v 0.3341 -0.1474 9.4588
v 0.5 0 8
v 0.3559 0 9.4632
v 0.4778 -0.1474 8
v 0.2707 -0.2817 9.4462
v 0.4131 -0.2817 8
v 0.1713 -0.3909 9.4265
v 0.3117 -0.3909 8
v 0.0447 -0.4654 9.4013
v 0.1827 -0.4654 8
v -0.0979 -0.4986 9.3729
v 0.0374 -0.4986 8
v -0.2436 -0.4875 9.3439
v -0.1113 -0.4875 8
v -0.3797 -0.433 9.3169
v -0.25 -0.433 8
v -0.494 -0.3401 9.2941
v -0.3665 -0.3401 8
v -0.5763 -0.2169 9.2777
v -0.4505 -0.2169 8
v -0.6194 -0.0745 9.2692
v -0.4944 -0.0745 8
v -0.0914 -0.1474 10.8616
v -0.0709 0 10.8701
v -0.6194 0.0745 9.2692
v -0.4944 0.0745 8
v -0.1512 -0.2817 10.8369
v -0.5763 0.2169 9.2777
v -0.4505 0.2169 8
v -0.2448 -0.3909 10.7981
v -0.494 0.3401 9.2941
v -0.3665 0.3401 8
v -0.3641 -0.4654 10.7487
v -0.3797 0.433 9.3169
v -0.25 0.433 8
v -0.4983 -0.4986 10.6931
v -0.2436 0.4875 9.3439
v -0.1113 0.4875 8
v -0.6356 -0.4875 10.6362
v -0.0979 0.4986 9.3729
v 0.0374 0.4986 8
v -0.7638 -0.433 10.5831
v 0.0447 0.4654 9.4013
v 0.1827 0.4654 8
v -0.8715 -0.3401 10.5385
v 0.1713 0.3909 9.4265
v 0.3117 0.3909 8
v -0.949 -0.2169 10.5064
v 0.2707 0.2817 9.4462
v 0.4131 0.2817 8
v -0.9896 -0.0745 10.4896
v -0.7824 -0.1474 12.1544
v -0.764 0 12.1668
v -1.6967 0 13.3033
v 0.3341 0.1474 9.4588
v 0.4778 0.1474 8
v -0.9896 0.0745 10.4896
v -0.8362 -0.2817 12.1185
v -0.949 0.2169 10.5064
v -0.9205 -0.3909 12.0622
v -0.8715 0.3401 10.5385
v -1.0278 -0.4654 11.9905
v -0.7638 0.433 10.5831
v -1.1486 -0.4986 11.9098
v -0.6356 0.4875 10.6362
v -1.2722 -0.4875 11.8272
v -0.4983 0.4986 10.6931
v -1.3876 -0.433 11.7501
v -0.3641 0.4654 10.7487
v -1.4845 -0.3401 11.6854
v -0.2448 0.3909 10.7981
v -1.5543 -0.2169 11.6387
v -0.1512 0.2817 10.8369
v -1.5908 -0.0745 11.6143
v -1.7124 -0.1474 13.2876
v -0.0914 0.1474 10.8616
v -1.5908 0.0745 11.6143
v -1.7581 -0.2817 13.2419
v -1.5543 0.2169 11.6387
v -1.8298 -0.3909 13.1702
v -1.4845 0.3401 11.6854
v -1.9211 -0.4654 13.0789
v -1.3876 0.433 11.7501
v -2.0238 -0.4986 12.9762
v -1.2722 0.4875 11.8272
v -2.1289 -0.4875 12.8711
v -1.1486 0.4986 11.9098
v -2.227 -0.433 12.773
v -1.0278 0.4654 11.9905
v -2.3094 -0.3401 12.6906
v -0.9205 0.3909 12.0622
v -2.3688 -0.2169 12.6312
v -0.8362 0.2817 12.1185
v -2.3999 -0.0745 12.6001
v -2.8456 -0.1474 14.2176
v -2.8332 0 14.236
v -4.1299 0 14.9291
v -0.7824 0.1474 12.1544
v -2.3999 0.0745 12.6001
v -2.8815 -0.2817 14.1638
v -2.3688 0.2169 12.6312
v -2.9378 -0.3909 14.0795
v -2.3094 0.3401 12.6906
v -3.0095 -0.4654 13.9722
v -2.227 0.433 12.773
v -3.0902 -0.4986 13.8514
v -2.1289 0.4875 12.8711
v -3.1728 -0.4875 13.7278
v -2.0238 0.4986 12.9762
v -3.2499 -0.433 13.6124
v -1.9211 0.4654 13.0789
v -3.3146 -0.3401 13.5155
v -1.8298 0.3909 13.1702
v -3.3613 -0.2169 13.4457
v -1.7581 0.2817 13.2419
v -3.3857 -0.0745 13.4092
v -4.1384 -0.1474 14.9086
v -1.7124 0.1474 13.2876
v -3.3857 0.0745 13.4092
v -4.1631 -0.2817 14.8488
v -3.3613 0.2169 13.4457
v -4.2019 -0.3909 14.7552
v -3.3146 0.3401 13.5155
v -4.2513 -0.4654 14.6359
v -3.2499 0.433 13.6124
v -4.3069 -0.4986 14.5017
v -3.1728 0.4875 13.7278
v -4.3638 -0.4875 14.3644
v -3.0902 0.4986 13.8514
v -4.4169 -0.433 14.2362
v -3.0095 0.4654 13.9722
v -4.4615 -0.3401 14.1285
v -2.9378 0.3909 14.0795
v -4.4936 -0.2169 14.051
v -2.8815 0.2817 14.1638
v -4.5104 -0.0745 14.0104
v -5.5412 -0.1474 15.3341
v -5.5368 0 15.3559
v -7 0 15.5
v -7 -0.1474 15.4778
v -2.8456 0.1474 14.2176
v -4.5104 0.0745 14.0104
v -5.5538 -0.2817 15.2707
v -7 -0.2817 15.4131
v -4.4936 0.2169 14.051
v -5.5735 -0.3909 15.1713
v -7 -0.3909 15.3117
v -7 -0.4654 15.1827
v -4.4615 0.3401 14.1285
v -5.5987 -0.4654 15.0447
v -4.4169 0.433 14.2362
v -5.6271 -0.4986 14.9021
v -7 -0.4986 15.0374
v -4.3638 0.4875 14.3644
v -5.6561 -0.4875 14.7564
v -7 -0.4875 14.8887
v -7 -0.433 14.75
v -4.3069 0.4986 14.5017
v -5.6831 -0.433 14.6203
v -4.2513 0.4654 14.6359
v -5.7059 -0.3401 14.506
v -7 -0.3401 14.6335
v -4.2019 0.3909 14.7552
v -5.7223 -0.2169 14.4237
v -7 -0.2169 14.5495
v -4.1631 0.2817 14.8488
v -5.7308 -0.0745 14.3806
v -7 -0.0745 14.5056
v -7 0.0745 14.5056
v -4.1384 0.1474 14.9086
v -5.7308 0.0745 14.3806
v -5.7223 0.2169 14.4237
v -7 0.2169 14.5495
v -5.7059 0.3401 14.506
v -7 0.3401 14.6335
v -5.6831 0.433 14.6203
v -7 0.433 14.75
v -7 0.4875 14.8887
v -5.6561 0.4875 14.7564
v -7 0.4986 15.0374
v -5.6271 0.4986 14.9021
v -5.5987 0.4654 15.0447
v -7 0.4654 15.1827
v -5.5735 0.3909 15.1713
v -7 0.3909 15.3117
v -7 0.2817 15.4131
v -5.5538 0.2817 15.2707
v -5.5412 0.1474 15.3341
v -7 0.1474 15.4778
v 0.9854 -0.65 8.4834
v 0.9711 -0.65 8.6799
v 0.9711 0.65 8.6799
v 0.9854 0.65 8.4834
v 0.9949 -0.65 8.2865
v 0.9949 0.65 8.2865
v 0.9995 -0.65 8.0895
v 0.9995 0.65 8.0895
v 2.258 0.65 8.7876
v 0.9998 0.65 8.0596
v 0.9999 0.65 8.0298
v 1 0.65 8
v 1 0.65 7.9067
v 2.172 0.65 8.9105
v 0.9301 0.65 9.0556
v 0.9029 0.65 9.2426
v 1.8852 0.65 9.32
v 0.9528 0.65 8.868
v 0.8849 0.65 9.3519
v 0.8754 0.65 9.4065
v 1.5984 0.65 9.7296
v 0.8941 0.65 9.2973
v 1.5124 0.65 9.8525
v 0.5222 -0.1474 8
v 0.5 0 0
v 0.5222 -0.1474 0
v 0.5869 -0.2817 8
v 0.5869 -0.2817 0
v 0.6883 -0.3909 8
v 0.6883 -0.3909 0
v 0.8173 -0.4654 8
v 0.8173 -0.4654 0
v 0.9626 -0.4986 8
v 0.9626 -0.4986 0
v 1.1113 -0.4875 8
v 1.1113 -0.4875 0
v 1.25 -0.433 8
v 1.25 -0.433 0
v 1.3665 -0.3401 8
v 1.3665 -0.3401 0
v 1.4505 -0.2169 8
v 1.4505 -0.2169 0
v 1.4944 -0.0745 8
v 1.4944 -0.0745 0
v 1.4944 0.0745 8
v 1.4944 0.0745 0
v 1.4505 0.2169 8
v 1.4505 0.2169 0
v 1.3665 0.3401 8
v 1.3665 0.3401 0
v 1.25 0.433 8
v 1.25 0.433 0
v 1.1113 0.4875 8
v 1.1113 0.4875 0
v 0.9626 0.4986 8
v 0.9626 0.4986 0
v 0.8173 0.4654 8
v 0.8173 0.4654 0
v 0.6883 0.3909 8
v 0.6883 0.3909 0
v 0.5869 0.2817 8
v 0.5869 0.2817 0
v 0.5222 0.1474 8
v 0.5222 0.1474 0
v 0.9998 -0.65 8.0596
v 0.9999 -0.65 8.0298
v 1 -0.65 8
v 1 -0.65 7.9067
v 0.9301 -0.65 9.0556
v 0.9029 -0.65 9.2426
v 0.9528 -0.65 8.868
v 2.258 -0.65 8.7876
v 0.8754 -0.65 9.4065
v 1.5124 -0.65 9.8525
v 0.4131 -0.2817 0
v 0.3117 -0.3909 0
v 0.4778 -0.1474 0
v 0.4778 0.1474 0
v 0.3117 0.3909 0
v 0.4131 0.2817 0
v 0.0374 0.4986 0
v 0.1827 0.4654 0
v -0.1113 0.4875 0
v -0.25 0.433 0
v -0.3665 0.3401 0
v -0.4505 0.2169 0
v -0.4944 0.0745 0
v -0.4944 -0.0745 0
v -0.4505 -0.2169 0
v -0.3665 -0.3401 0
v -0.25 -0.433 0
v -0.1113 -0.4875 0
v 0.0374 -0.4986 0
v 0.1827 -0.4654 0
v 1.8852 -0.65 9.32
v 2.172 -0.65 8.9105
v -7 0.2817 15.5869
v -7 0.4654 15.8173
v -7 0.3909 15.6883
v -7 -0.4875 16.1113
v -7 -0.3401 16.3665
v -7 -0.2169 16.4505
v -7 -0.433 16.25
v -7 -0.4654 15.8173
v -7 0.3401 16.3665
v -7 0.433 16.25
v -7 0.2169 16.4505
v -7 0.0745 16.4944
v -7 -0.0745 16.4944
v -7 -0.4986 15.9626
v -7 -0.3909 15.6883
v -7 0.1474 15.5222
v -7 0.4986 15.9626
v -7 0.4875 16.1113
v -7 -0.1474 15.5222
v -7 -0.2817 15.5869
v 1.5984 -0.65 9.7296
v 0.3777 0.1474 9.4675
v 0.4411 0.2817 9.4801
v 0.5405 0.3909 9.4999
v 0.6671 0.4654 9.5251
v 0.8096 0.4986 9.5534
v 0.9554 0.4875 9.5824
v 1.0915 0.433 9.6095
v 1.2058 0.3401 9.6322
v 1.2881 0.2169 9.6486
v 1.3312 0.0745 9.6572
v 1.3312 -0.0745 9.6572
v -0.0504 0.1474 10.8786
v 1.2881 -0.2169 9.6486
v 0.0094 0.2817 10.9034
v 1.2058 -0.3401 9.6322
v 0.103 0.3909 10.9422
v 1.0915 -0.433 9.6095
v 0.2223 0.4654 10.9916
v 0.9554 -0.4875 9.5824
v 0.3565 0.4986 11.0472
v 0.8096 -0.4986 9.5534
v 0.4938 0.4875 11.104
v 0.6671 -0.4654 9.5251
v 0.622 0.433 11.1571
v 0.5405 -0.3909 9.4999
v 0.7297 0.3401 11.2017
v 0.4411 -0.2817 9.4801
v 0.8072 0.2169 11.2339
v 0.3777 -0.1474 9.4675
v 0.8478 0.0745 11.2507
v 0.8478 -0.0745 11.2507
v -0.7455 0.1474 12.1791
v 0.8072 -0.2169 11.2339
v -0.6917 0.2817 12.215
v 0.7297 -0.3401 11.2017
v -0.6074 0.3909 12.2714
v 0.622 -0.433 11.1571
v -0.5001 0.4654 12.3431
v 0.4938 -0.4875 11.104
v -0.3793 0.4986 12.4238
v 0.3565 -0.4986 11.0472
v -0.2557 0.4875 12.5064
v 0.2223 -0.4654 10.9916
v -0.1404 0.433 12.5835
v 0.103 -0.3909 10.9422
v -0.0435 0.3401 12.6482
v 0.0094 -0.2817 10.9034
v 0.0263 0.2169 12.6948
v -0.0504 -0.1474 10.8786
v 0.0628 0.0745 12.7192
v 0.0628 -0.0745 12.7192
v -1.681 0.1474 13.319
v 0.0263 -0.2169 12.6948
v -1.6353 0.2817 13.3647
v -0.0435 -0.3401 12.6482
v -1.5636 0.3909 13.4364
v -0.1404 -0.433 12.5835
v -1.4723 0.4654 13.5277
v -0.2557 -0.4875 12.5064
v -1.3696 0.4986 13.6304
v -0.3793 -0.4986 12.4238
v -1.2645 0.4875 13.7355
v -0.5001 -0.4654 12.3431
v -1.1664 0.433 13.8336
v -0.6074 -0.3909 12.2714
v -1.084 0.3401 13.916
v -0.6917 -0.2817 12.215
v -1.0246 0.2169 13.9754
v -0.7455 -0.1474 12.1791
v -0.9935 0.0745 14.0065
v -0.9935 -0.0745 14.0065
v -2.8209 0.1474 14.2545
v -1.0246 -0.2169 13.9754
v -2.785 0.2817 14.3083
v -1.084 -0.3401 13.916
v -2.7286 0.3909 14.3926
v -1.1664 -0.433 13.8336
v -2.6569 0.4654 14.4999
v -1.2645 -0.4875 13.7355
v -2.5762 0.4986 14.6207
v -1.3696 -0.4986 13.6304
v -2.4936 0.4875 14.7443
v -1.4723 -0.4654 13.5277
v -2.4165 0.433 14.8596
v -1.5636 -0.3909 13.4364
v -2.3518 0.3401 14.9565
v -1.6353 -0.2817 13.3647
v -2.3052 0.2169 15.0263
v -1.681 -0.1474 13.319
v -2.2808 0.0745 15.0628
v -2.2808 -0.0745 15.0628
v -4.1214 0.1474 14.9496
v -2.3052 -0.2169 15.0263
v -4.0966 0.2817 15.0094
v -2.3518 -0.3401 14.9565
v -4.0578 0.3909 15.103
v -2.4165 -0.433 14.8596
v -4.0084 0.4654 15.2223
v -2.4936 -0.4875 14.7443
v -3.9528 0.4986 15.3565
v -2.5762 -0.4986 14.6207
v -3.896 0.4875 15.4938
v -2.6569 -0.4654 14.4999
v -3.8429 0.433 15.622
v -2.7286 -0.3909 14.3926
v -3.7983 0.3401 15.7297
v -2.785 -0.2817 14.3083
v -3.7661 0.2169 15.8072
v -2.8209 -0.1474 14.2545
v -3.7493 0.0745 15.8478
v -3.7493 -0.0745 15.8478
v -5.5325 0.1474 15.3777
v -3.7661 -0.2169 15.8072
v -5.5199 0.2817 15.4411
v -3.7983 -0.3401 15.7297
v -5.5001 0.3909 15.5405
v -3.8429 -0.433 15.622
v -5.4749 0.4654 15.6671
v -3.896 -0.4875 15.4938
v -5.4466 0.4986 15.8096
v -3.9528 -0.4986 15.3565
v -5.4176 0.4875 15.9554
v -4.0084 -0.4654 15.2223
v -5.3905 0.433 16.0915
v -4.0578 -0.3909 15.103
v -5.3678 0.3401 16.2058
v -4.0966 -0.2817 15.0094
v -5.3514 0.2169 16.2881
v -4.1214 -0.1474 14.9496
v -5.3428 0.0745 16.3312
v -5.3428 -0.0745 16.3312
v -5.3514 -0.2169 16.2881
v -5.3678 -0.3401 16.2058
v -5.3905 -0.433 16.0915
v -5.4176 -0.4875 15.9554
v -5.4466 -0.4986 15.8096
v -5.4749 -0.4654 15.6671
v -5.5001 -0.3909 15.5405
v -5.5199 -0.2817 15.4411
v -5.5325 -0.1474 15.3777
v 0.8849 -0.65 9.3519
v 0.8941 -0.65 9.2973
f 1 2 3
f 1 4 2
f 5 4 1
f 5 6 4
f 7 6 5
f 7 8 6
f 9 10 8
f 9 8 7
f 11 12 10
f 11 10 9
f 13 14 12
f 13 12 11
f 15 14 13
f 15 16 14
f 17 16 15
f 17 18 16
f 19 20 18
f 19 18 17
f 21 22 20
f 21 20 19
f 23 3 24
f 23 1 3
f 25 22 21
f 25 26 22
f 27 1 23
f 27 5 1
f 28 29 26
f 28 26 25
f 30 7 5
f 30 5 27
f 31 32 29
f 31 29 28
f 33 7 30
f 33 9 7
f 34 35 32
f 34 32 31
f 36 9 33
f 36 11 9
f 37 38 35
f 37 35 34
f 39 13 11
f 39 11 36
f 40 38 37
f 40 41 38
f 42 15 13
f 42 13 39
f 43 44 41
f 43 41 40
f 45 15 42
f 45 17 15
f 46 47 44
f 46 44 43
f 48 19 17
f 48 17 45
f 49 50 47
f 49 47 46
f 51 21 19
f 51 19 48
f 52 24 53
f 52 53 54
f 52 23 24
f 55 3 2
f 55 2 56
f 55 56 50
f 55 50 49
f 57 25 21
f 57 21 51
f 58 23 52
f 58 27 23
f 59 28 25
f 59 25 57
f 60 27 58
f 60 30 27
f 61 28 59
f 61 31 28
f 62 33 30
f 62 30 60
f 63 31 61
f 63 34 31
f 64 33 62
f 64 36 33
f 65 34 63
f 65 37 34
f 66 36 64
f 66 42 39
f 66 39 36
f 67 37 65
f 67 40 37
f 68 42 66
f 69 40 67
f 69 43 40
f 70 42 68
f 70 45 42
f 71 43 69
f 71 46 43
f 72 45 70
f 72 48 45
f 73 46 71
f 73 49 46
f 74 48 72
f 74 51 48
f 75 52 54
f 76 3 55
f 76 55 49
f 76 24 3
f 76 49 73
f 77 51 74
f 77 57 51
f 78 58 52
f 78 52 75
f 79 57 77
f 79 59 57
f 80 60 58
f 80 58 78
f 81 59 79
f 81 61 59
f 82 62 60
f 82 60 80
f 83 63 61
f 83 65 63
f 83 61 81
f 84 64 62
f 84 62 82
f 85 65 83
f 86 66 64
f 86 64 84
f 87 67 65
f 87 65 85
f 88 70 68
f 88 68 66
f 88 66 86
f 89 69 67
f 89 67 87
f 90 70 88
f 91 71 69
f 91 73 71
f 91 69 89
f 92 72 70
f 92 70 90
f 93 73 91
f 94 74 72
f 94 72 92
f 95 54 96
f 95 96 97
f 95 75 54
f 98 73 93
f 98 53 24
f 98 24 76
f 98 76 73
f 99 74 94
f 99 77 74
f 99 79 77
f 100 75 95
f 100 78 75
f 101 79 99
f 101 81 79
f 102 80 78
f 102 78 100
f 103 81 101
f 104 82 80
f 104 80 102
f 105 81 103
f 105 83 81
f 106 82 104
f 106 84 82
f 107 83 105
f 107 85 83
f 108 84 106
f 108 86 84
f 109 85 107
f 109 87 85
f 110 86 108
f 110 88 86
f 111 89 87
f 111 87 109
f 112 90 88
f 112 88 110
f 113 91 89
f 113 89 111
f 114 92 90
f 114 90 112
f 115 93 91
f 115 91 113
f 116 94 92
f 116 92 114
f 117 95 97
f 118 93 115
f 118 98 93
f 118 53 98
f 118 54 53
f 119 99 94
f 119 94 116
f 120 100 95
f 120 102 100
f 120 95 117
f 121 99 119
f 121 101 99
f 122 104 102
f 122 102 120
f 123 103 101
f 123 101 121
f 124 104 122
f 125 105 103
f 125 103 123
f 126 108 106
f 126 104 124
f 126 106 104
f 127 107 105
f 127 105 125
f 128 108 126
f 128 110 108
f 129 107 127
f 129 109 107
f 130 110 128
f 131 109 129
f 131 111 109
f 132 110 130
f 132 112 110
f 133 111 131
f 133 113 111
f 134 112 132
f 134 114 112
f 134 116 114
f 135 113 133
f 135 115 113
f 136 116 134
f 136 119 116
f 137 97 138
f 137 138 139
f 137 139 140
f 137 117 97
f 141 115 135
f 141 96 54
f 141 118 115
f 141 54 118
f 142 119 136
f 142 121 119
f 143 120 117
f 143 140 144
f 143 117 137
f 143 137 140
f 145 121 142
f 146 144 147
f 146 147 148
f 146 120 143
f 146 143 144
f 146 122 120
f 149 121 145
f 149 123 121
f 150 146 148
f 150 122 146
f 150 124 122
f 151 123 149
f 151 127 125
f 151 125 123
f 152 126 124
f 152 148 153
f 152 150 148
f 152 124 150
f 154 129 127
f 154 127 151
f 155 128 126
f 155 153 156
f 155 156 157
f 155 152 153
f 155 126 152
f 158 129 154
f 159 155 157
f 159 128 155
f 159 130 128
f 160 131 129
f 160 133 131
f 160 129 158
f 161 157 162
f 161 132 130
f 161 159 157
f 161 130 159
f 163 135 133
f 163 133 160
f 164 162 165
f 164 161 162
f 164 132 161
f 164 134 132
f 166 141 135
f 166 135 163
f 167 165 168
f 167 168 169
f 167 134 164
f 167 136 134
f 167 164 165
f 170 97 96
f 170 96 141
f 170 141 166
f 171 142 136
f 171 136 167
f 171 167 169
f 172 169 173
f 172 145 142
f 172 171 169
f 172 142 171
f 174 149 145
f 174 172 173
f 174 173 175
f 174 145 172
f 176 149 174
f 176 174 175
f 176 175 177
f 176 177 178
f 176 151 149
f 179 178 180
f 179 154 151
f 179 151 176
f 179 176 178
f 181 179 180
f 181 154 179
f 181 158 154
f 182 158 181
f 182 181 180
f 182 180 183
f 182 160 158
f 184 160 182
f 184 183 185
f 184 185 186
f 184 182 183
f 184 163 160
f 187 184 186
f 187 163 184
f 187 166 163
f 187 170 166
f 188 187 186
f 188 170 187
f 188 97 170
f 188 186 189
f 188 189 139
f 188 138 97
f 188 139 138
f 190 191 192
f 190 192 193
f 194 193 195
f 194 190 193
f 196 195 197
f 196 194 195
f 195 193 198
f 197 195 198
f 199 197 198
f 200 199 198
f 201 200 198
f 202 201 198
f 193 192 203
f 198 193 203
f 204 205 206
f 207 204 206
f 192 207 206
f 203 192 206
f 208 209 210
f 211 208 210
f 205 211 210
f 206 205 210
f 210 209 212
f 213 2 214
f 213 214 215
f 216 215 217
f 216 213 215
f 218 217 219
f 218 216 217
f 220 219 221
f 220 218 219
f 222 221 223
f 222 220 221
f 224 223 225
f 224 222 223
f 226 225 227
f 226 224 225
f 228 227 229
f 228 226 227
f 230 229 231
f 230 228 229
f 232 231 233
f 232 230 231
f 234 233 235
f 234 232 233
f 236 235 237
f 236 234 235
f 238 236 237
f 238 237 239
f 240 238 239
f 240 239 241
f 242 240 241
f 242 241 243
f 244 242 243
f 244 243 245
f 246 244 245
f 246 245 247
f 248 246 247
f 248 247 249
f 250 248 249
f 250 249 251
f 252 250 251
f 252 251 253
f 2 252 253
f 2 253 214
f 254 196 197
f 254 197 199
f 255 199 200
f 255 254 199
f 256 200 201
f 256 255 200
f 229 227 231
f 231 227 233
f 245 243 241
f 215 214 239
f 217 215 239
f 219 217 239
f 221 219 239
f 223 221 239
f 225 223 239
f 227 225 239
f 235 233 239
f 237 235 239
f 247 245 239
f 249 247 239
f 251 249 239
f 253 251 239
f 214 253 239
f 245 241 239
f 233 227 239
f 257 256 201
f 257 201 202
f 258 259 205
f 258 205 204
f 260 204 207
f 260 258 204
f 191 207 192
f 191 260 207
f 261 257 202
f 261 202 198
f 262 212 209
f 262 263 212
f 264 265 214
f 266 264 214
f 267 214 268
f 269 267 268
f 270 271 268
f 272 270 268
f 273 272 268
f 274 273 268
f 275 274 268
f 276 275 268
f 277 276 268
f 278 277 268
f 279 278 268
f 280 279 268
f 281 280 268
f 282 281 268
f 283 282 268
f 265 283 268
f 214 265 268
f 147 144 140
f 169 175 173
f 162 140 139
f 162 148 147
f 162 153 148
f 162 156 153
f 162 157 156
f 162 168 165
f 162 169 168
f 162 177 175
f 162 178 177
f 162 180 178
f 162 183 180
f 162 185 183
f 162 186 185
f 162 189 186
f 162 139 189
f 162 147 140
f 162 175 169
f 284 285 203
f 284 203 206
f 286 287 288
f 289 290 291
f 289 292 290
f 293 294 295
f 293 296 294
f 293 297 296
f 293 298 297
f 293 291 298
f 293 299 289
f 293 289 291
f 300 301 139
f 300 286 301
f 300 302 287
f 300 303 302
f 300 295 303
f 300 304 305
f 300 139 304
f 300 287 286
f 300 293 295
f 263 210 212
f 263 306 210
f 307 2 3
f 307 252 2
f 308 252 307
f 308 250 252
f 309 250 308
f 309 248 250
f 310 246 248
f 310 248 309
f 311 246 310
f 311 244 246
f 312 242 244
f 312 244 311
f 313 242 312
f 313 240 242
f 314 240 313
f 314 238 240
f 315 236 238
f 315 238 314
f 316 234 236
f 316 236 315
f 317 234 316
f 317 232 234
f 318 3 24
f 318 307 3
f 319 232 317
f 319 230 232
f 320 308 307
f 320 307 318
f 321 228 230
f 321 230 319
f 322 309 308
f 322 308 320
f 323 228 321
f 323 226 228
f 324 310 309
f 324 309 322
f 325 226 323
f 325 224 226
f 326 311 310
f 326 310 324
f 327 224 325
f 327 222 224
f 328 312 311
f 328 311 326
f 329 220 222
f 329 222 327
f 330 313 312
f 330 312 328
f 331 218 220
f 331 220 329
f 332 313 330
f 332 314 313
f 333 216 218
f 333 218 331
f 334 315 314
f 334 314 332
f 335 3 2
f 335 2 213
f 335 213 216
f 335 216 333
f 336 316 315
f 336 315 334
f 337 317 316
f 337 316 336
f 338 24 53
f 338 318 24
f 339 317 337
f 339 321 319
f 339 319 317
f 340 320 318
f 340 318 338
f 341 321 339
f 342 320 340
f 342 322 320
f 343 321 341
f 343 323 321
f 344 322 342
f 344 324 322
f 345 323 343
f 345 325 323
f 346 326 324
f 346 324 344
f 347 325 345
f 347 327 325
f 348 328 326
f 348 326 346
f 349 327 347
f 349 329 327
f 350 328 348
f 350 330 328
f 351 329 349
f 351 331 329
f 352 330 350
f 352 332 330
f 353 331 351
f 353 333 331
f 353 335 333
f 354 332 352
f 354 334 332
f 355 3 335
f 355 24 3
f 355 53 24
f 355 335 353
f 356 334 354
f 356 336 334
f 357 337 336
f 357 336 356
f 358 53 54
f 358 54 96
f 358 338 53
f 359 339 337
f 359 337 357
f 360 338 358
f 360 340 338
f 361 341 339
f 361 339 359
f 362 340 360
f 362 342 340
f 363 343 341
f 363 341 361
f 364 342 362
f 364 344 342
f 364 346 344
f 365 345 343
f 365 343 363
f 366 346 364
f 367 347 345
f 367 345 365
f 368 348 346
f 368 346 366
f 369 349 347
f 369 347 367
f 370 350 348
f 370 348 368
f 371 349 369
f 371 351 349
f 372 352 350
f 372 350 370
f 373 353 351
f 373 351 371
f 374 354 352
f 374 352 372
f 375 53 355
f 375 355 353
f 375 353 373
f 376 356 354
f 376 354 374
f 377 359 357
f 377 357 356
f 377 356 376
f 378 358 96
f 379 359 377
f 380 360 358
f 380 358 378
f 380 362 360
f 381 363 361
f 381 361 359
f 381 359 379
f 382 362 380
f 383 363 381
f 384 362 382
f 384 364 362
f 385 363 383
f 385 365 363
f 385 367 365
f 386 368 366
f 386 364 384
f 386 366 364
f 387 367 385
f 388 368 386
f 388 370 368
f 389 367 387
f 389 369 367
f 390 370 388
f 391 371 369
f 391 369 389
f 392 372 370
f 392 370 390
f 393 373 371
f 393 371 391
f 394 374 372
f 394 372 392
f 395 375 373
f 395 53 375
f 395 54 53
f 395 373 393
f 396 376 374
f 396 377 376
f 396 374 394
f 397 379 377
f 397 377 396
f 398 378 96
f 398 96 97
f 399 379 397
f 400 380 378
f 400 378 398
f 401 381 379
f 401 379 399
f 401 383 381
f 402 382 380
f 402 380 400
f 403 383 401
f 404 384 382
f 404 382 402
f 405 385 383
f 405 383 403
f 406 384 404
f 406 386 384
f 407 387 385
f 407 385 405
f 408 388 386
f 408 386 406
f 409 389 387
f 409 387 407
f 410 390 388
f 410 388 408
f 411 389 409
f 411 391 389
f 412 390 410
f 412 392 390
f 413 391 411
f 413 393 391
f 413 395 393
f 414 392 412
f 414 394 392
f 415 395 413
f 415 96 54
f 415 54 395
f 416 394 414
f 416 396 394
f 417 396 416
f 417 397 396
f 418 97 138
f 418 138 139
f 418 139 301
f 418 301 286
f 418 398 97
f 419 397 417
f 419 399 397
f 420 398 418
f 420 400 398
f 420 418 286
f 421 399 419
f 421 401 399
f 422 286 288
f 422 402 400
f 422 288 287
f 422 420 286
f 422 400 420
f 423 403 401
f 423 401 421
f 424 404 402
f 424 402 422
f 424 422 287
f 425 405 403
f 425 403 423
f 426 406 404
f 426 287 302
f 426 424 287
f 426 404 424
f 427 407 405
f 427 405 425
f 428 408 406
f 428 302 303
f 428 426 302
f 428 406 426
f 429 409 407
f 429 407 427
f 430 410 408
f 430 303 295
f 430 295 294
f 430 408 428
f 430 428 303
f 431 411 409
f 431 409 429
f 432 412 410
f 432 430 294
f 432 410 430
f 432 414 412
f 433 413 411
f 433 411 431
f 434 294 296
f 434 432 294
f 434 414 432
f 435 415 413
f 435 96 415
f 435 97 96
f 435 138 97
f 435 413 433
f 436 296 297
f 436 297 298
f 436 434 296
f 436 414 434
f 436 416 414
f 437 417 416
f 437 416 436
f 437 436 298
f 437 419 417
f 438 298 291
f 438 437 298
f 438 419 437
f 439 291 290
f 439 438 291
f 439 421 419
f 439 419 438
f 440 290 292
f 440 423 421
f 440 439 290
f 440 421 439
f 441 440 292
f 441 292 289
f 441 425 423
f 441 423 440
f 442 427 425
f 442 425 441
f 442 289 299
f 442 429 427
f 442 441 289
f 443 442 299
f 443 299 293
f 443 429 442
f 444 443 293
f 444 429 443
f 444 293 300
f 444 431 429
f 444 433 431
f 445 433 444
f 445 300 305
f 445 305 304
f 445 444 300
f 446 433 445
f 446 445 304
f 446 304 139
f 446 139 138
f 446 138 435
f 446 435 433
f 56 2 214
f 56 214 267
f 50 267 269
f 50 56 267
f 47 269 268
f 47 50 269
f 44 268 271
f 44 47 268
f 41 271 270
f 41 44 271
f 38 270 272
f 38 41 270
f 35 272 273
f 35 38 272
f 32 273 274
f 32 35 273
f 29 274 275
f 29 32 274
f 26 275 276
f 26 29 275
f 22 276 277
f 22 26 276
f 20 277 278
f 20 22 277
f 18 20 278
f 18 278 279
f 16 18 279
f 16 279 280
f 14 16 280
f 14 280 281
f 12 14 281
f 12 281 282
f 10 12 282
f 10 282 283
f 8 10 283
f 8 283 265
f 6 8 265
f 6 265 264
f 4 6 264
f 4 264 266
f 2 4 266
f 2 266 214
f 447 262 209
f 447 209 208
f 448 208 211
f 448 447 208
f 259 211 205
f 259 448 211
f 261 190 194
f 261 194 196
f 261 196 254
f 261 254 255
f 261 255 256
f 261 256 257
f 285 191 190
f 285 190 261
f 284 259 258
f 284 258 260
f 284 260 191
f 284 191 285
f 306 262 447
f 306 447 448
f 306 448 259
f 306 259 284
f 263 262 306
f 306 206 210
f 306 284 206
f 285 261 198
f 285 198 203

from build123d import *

# Parameters (mm, degrees)
F1_R     = 0.5
F3_DEPTH = 0.65


with BuildPart() as f2:
    # F2: sweep along a path in F0
    with BuildLine(Plane.XZ) as f2_path:
        Line((0, 0), (0, 8))
        ThreePointArc((0, 8), (-2.0502525317, 12.9497474683), (-7, 15))
    # F1 (on Top) → F2 (sweep)
    with BuildSketch(Plane.XY):
        with BuildLine():
            ThreePointArc((1.5, 0), (1, 0.5), (0.5, 0))
            ThreePointArc((0.5, 0), (1, -0.5), (1.5, 0))
        make_face()
        Circle(F1_R)
    sweep(path=f2_path.line)


with BuildPart() as f3:
    # F0 (on Front) → F3 (new body, symmetric)
    with BuildSketch(Plane.XZ):
        with BuildLine():
            Line((1.5123971976, 9.8524954013), (0.875396083, 9.4064624189))
            ThreePointArc((0.875396083, 9.4064624189), (0.8895764218, 9.3246070677), (0.9029059955, 9.2426088788))
            Line((0.9029059955, 9.2426088788), (1.5984336631, 9.7296225946))
            Line((1.5984336631, 9.7296225946), (1.5123971976, 9.8524954013))
        make_face()
        with BuildLine():
            ThreePointArc((0.9029059955, 9.2426088788), (0.9419639806, 8.9618773995), (0.9710528538, 8.6799385282))
            Line((0.9710528538, 8.6799385282), (1.8852218813, 9.3200465725))
            Line((1.8852218813, 9.3200465725), (1.5984336631, 9.7296225946))
            Line((1.5984336631, 9.7296225946), (0.9029059955, 9.2426088788))
        make_face()
        with BuildLine():
            Line((2.1720100995, 8.9104705503), (0.9994996802, 8.0894699162))
            ThreePointArc((0.9994996802, 8.0894699162), (0.9998749191, 8.0447356575), (1, 8))
            Line((1, 8), (1, 7.9067040555))
            Line((1, 7.9067040555), (2.2580465649, 8.7875977437))
            Line((2.2580465649, 8.7875977437), (2.1720100995, 8.9104705503))
        make_face()
        with BuildLine():
            Line((1.8852218813, 9.3200465725), (0.9710528538, 8.6799385282))
            ThreePointArc((0.9710528538, 8.6799385282), (0.9907321539, 8.3849670688), (0.9994996802, 8.0894699162))
            Line((0.9994996802, 8.0894699162), (2.1720100995, 8.9104705503))
            Line((2.1720100995, 8.9104705503), (1.8852218813, 9.3200465725))
        make_face()
    extrude(amount=F3_DEPTH, both=True)


solid = Compound([f2.part, f3.part])
